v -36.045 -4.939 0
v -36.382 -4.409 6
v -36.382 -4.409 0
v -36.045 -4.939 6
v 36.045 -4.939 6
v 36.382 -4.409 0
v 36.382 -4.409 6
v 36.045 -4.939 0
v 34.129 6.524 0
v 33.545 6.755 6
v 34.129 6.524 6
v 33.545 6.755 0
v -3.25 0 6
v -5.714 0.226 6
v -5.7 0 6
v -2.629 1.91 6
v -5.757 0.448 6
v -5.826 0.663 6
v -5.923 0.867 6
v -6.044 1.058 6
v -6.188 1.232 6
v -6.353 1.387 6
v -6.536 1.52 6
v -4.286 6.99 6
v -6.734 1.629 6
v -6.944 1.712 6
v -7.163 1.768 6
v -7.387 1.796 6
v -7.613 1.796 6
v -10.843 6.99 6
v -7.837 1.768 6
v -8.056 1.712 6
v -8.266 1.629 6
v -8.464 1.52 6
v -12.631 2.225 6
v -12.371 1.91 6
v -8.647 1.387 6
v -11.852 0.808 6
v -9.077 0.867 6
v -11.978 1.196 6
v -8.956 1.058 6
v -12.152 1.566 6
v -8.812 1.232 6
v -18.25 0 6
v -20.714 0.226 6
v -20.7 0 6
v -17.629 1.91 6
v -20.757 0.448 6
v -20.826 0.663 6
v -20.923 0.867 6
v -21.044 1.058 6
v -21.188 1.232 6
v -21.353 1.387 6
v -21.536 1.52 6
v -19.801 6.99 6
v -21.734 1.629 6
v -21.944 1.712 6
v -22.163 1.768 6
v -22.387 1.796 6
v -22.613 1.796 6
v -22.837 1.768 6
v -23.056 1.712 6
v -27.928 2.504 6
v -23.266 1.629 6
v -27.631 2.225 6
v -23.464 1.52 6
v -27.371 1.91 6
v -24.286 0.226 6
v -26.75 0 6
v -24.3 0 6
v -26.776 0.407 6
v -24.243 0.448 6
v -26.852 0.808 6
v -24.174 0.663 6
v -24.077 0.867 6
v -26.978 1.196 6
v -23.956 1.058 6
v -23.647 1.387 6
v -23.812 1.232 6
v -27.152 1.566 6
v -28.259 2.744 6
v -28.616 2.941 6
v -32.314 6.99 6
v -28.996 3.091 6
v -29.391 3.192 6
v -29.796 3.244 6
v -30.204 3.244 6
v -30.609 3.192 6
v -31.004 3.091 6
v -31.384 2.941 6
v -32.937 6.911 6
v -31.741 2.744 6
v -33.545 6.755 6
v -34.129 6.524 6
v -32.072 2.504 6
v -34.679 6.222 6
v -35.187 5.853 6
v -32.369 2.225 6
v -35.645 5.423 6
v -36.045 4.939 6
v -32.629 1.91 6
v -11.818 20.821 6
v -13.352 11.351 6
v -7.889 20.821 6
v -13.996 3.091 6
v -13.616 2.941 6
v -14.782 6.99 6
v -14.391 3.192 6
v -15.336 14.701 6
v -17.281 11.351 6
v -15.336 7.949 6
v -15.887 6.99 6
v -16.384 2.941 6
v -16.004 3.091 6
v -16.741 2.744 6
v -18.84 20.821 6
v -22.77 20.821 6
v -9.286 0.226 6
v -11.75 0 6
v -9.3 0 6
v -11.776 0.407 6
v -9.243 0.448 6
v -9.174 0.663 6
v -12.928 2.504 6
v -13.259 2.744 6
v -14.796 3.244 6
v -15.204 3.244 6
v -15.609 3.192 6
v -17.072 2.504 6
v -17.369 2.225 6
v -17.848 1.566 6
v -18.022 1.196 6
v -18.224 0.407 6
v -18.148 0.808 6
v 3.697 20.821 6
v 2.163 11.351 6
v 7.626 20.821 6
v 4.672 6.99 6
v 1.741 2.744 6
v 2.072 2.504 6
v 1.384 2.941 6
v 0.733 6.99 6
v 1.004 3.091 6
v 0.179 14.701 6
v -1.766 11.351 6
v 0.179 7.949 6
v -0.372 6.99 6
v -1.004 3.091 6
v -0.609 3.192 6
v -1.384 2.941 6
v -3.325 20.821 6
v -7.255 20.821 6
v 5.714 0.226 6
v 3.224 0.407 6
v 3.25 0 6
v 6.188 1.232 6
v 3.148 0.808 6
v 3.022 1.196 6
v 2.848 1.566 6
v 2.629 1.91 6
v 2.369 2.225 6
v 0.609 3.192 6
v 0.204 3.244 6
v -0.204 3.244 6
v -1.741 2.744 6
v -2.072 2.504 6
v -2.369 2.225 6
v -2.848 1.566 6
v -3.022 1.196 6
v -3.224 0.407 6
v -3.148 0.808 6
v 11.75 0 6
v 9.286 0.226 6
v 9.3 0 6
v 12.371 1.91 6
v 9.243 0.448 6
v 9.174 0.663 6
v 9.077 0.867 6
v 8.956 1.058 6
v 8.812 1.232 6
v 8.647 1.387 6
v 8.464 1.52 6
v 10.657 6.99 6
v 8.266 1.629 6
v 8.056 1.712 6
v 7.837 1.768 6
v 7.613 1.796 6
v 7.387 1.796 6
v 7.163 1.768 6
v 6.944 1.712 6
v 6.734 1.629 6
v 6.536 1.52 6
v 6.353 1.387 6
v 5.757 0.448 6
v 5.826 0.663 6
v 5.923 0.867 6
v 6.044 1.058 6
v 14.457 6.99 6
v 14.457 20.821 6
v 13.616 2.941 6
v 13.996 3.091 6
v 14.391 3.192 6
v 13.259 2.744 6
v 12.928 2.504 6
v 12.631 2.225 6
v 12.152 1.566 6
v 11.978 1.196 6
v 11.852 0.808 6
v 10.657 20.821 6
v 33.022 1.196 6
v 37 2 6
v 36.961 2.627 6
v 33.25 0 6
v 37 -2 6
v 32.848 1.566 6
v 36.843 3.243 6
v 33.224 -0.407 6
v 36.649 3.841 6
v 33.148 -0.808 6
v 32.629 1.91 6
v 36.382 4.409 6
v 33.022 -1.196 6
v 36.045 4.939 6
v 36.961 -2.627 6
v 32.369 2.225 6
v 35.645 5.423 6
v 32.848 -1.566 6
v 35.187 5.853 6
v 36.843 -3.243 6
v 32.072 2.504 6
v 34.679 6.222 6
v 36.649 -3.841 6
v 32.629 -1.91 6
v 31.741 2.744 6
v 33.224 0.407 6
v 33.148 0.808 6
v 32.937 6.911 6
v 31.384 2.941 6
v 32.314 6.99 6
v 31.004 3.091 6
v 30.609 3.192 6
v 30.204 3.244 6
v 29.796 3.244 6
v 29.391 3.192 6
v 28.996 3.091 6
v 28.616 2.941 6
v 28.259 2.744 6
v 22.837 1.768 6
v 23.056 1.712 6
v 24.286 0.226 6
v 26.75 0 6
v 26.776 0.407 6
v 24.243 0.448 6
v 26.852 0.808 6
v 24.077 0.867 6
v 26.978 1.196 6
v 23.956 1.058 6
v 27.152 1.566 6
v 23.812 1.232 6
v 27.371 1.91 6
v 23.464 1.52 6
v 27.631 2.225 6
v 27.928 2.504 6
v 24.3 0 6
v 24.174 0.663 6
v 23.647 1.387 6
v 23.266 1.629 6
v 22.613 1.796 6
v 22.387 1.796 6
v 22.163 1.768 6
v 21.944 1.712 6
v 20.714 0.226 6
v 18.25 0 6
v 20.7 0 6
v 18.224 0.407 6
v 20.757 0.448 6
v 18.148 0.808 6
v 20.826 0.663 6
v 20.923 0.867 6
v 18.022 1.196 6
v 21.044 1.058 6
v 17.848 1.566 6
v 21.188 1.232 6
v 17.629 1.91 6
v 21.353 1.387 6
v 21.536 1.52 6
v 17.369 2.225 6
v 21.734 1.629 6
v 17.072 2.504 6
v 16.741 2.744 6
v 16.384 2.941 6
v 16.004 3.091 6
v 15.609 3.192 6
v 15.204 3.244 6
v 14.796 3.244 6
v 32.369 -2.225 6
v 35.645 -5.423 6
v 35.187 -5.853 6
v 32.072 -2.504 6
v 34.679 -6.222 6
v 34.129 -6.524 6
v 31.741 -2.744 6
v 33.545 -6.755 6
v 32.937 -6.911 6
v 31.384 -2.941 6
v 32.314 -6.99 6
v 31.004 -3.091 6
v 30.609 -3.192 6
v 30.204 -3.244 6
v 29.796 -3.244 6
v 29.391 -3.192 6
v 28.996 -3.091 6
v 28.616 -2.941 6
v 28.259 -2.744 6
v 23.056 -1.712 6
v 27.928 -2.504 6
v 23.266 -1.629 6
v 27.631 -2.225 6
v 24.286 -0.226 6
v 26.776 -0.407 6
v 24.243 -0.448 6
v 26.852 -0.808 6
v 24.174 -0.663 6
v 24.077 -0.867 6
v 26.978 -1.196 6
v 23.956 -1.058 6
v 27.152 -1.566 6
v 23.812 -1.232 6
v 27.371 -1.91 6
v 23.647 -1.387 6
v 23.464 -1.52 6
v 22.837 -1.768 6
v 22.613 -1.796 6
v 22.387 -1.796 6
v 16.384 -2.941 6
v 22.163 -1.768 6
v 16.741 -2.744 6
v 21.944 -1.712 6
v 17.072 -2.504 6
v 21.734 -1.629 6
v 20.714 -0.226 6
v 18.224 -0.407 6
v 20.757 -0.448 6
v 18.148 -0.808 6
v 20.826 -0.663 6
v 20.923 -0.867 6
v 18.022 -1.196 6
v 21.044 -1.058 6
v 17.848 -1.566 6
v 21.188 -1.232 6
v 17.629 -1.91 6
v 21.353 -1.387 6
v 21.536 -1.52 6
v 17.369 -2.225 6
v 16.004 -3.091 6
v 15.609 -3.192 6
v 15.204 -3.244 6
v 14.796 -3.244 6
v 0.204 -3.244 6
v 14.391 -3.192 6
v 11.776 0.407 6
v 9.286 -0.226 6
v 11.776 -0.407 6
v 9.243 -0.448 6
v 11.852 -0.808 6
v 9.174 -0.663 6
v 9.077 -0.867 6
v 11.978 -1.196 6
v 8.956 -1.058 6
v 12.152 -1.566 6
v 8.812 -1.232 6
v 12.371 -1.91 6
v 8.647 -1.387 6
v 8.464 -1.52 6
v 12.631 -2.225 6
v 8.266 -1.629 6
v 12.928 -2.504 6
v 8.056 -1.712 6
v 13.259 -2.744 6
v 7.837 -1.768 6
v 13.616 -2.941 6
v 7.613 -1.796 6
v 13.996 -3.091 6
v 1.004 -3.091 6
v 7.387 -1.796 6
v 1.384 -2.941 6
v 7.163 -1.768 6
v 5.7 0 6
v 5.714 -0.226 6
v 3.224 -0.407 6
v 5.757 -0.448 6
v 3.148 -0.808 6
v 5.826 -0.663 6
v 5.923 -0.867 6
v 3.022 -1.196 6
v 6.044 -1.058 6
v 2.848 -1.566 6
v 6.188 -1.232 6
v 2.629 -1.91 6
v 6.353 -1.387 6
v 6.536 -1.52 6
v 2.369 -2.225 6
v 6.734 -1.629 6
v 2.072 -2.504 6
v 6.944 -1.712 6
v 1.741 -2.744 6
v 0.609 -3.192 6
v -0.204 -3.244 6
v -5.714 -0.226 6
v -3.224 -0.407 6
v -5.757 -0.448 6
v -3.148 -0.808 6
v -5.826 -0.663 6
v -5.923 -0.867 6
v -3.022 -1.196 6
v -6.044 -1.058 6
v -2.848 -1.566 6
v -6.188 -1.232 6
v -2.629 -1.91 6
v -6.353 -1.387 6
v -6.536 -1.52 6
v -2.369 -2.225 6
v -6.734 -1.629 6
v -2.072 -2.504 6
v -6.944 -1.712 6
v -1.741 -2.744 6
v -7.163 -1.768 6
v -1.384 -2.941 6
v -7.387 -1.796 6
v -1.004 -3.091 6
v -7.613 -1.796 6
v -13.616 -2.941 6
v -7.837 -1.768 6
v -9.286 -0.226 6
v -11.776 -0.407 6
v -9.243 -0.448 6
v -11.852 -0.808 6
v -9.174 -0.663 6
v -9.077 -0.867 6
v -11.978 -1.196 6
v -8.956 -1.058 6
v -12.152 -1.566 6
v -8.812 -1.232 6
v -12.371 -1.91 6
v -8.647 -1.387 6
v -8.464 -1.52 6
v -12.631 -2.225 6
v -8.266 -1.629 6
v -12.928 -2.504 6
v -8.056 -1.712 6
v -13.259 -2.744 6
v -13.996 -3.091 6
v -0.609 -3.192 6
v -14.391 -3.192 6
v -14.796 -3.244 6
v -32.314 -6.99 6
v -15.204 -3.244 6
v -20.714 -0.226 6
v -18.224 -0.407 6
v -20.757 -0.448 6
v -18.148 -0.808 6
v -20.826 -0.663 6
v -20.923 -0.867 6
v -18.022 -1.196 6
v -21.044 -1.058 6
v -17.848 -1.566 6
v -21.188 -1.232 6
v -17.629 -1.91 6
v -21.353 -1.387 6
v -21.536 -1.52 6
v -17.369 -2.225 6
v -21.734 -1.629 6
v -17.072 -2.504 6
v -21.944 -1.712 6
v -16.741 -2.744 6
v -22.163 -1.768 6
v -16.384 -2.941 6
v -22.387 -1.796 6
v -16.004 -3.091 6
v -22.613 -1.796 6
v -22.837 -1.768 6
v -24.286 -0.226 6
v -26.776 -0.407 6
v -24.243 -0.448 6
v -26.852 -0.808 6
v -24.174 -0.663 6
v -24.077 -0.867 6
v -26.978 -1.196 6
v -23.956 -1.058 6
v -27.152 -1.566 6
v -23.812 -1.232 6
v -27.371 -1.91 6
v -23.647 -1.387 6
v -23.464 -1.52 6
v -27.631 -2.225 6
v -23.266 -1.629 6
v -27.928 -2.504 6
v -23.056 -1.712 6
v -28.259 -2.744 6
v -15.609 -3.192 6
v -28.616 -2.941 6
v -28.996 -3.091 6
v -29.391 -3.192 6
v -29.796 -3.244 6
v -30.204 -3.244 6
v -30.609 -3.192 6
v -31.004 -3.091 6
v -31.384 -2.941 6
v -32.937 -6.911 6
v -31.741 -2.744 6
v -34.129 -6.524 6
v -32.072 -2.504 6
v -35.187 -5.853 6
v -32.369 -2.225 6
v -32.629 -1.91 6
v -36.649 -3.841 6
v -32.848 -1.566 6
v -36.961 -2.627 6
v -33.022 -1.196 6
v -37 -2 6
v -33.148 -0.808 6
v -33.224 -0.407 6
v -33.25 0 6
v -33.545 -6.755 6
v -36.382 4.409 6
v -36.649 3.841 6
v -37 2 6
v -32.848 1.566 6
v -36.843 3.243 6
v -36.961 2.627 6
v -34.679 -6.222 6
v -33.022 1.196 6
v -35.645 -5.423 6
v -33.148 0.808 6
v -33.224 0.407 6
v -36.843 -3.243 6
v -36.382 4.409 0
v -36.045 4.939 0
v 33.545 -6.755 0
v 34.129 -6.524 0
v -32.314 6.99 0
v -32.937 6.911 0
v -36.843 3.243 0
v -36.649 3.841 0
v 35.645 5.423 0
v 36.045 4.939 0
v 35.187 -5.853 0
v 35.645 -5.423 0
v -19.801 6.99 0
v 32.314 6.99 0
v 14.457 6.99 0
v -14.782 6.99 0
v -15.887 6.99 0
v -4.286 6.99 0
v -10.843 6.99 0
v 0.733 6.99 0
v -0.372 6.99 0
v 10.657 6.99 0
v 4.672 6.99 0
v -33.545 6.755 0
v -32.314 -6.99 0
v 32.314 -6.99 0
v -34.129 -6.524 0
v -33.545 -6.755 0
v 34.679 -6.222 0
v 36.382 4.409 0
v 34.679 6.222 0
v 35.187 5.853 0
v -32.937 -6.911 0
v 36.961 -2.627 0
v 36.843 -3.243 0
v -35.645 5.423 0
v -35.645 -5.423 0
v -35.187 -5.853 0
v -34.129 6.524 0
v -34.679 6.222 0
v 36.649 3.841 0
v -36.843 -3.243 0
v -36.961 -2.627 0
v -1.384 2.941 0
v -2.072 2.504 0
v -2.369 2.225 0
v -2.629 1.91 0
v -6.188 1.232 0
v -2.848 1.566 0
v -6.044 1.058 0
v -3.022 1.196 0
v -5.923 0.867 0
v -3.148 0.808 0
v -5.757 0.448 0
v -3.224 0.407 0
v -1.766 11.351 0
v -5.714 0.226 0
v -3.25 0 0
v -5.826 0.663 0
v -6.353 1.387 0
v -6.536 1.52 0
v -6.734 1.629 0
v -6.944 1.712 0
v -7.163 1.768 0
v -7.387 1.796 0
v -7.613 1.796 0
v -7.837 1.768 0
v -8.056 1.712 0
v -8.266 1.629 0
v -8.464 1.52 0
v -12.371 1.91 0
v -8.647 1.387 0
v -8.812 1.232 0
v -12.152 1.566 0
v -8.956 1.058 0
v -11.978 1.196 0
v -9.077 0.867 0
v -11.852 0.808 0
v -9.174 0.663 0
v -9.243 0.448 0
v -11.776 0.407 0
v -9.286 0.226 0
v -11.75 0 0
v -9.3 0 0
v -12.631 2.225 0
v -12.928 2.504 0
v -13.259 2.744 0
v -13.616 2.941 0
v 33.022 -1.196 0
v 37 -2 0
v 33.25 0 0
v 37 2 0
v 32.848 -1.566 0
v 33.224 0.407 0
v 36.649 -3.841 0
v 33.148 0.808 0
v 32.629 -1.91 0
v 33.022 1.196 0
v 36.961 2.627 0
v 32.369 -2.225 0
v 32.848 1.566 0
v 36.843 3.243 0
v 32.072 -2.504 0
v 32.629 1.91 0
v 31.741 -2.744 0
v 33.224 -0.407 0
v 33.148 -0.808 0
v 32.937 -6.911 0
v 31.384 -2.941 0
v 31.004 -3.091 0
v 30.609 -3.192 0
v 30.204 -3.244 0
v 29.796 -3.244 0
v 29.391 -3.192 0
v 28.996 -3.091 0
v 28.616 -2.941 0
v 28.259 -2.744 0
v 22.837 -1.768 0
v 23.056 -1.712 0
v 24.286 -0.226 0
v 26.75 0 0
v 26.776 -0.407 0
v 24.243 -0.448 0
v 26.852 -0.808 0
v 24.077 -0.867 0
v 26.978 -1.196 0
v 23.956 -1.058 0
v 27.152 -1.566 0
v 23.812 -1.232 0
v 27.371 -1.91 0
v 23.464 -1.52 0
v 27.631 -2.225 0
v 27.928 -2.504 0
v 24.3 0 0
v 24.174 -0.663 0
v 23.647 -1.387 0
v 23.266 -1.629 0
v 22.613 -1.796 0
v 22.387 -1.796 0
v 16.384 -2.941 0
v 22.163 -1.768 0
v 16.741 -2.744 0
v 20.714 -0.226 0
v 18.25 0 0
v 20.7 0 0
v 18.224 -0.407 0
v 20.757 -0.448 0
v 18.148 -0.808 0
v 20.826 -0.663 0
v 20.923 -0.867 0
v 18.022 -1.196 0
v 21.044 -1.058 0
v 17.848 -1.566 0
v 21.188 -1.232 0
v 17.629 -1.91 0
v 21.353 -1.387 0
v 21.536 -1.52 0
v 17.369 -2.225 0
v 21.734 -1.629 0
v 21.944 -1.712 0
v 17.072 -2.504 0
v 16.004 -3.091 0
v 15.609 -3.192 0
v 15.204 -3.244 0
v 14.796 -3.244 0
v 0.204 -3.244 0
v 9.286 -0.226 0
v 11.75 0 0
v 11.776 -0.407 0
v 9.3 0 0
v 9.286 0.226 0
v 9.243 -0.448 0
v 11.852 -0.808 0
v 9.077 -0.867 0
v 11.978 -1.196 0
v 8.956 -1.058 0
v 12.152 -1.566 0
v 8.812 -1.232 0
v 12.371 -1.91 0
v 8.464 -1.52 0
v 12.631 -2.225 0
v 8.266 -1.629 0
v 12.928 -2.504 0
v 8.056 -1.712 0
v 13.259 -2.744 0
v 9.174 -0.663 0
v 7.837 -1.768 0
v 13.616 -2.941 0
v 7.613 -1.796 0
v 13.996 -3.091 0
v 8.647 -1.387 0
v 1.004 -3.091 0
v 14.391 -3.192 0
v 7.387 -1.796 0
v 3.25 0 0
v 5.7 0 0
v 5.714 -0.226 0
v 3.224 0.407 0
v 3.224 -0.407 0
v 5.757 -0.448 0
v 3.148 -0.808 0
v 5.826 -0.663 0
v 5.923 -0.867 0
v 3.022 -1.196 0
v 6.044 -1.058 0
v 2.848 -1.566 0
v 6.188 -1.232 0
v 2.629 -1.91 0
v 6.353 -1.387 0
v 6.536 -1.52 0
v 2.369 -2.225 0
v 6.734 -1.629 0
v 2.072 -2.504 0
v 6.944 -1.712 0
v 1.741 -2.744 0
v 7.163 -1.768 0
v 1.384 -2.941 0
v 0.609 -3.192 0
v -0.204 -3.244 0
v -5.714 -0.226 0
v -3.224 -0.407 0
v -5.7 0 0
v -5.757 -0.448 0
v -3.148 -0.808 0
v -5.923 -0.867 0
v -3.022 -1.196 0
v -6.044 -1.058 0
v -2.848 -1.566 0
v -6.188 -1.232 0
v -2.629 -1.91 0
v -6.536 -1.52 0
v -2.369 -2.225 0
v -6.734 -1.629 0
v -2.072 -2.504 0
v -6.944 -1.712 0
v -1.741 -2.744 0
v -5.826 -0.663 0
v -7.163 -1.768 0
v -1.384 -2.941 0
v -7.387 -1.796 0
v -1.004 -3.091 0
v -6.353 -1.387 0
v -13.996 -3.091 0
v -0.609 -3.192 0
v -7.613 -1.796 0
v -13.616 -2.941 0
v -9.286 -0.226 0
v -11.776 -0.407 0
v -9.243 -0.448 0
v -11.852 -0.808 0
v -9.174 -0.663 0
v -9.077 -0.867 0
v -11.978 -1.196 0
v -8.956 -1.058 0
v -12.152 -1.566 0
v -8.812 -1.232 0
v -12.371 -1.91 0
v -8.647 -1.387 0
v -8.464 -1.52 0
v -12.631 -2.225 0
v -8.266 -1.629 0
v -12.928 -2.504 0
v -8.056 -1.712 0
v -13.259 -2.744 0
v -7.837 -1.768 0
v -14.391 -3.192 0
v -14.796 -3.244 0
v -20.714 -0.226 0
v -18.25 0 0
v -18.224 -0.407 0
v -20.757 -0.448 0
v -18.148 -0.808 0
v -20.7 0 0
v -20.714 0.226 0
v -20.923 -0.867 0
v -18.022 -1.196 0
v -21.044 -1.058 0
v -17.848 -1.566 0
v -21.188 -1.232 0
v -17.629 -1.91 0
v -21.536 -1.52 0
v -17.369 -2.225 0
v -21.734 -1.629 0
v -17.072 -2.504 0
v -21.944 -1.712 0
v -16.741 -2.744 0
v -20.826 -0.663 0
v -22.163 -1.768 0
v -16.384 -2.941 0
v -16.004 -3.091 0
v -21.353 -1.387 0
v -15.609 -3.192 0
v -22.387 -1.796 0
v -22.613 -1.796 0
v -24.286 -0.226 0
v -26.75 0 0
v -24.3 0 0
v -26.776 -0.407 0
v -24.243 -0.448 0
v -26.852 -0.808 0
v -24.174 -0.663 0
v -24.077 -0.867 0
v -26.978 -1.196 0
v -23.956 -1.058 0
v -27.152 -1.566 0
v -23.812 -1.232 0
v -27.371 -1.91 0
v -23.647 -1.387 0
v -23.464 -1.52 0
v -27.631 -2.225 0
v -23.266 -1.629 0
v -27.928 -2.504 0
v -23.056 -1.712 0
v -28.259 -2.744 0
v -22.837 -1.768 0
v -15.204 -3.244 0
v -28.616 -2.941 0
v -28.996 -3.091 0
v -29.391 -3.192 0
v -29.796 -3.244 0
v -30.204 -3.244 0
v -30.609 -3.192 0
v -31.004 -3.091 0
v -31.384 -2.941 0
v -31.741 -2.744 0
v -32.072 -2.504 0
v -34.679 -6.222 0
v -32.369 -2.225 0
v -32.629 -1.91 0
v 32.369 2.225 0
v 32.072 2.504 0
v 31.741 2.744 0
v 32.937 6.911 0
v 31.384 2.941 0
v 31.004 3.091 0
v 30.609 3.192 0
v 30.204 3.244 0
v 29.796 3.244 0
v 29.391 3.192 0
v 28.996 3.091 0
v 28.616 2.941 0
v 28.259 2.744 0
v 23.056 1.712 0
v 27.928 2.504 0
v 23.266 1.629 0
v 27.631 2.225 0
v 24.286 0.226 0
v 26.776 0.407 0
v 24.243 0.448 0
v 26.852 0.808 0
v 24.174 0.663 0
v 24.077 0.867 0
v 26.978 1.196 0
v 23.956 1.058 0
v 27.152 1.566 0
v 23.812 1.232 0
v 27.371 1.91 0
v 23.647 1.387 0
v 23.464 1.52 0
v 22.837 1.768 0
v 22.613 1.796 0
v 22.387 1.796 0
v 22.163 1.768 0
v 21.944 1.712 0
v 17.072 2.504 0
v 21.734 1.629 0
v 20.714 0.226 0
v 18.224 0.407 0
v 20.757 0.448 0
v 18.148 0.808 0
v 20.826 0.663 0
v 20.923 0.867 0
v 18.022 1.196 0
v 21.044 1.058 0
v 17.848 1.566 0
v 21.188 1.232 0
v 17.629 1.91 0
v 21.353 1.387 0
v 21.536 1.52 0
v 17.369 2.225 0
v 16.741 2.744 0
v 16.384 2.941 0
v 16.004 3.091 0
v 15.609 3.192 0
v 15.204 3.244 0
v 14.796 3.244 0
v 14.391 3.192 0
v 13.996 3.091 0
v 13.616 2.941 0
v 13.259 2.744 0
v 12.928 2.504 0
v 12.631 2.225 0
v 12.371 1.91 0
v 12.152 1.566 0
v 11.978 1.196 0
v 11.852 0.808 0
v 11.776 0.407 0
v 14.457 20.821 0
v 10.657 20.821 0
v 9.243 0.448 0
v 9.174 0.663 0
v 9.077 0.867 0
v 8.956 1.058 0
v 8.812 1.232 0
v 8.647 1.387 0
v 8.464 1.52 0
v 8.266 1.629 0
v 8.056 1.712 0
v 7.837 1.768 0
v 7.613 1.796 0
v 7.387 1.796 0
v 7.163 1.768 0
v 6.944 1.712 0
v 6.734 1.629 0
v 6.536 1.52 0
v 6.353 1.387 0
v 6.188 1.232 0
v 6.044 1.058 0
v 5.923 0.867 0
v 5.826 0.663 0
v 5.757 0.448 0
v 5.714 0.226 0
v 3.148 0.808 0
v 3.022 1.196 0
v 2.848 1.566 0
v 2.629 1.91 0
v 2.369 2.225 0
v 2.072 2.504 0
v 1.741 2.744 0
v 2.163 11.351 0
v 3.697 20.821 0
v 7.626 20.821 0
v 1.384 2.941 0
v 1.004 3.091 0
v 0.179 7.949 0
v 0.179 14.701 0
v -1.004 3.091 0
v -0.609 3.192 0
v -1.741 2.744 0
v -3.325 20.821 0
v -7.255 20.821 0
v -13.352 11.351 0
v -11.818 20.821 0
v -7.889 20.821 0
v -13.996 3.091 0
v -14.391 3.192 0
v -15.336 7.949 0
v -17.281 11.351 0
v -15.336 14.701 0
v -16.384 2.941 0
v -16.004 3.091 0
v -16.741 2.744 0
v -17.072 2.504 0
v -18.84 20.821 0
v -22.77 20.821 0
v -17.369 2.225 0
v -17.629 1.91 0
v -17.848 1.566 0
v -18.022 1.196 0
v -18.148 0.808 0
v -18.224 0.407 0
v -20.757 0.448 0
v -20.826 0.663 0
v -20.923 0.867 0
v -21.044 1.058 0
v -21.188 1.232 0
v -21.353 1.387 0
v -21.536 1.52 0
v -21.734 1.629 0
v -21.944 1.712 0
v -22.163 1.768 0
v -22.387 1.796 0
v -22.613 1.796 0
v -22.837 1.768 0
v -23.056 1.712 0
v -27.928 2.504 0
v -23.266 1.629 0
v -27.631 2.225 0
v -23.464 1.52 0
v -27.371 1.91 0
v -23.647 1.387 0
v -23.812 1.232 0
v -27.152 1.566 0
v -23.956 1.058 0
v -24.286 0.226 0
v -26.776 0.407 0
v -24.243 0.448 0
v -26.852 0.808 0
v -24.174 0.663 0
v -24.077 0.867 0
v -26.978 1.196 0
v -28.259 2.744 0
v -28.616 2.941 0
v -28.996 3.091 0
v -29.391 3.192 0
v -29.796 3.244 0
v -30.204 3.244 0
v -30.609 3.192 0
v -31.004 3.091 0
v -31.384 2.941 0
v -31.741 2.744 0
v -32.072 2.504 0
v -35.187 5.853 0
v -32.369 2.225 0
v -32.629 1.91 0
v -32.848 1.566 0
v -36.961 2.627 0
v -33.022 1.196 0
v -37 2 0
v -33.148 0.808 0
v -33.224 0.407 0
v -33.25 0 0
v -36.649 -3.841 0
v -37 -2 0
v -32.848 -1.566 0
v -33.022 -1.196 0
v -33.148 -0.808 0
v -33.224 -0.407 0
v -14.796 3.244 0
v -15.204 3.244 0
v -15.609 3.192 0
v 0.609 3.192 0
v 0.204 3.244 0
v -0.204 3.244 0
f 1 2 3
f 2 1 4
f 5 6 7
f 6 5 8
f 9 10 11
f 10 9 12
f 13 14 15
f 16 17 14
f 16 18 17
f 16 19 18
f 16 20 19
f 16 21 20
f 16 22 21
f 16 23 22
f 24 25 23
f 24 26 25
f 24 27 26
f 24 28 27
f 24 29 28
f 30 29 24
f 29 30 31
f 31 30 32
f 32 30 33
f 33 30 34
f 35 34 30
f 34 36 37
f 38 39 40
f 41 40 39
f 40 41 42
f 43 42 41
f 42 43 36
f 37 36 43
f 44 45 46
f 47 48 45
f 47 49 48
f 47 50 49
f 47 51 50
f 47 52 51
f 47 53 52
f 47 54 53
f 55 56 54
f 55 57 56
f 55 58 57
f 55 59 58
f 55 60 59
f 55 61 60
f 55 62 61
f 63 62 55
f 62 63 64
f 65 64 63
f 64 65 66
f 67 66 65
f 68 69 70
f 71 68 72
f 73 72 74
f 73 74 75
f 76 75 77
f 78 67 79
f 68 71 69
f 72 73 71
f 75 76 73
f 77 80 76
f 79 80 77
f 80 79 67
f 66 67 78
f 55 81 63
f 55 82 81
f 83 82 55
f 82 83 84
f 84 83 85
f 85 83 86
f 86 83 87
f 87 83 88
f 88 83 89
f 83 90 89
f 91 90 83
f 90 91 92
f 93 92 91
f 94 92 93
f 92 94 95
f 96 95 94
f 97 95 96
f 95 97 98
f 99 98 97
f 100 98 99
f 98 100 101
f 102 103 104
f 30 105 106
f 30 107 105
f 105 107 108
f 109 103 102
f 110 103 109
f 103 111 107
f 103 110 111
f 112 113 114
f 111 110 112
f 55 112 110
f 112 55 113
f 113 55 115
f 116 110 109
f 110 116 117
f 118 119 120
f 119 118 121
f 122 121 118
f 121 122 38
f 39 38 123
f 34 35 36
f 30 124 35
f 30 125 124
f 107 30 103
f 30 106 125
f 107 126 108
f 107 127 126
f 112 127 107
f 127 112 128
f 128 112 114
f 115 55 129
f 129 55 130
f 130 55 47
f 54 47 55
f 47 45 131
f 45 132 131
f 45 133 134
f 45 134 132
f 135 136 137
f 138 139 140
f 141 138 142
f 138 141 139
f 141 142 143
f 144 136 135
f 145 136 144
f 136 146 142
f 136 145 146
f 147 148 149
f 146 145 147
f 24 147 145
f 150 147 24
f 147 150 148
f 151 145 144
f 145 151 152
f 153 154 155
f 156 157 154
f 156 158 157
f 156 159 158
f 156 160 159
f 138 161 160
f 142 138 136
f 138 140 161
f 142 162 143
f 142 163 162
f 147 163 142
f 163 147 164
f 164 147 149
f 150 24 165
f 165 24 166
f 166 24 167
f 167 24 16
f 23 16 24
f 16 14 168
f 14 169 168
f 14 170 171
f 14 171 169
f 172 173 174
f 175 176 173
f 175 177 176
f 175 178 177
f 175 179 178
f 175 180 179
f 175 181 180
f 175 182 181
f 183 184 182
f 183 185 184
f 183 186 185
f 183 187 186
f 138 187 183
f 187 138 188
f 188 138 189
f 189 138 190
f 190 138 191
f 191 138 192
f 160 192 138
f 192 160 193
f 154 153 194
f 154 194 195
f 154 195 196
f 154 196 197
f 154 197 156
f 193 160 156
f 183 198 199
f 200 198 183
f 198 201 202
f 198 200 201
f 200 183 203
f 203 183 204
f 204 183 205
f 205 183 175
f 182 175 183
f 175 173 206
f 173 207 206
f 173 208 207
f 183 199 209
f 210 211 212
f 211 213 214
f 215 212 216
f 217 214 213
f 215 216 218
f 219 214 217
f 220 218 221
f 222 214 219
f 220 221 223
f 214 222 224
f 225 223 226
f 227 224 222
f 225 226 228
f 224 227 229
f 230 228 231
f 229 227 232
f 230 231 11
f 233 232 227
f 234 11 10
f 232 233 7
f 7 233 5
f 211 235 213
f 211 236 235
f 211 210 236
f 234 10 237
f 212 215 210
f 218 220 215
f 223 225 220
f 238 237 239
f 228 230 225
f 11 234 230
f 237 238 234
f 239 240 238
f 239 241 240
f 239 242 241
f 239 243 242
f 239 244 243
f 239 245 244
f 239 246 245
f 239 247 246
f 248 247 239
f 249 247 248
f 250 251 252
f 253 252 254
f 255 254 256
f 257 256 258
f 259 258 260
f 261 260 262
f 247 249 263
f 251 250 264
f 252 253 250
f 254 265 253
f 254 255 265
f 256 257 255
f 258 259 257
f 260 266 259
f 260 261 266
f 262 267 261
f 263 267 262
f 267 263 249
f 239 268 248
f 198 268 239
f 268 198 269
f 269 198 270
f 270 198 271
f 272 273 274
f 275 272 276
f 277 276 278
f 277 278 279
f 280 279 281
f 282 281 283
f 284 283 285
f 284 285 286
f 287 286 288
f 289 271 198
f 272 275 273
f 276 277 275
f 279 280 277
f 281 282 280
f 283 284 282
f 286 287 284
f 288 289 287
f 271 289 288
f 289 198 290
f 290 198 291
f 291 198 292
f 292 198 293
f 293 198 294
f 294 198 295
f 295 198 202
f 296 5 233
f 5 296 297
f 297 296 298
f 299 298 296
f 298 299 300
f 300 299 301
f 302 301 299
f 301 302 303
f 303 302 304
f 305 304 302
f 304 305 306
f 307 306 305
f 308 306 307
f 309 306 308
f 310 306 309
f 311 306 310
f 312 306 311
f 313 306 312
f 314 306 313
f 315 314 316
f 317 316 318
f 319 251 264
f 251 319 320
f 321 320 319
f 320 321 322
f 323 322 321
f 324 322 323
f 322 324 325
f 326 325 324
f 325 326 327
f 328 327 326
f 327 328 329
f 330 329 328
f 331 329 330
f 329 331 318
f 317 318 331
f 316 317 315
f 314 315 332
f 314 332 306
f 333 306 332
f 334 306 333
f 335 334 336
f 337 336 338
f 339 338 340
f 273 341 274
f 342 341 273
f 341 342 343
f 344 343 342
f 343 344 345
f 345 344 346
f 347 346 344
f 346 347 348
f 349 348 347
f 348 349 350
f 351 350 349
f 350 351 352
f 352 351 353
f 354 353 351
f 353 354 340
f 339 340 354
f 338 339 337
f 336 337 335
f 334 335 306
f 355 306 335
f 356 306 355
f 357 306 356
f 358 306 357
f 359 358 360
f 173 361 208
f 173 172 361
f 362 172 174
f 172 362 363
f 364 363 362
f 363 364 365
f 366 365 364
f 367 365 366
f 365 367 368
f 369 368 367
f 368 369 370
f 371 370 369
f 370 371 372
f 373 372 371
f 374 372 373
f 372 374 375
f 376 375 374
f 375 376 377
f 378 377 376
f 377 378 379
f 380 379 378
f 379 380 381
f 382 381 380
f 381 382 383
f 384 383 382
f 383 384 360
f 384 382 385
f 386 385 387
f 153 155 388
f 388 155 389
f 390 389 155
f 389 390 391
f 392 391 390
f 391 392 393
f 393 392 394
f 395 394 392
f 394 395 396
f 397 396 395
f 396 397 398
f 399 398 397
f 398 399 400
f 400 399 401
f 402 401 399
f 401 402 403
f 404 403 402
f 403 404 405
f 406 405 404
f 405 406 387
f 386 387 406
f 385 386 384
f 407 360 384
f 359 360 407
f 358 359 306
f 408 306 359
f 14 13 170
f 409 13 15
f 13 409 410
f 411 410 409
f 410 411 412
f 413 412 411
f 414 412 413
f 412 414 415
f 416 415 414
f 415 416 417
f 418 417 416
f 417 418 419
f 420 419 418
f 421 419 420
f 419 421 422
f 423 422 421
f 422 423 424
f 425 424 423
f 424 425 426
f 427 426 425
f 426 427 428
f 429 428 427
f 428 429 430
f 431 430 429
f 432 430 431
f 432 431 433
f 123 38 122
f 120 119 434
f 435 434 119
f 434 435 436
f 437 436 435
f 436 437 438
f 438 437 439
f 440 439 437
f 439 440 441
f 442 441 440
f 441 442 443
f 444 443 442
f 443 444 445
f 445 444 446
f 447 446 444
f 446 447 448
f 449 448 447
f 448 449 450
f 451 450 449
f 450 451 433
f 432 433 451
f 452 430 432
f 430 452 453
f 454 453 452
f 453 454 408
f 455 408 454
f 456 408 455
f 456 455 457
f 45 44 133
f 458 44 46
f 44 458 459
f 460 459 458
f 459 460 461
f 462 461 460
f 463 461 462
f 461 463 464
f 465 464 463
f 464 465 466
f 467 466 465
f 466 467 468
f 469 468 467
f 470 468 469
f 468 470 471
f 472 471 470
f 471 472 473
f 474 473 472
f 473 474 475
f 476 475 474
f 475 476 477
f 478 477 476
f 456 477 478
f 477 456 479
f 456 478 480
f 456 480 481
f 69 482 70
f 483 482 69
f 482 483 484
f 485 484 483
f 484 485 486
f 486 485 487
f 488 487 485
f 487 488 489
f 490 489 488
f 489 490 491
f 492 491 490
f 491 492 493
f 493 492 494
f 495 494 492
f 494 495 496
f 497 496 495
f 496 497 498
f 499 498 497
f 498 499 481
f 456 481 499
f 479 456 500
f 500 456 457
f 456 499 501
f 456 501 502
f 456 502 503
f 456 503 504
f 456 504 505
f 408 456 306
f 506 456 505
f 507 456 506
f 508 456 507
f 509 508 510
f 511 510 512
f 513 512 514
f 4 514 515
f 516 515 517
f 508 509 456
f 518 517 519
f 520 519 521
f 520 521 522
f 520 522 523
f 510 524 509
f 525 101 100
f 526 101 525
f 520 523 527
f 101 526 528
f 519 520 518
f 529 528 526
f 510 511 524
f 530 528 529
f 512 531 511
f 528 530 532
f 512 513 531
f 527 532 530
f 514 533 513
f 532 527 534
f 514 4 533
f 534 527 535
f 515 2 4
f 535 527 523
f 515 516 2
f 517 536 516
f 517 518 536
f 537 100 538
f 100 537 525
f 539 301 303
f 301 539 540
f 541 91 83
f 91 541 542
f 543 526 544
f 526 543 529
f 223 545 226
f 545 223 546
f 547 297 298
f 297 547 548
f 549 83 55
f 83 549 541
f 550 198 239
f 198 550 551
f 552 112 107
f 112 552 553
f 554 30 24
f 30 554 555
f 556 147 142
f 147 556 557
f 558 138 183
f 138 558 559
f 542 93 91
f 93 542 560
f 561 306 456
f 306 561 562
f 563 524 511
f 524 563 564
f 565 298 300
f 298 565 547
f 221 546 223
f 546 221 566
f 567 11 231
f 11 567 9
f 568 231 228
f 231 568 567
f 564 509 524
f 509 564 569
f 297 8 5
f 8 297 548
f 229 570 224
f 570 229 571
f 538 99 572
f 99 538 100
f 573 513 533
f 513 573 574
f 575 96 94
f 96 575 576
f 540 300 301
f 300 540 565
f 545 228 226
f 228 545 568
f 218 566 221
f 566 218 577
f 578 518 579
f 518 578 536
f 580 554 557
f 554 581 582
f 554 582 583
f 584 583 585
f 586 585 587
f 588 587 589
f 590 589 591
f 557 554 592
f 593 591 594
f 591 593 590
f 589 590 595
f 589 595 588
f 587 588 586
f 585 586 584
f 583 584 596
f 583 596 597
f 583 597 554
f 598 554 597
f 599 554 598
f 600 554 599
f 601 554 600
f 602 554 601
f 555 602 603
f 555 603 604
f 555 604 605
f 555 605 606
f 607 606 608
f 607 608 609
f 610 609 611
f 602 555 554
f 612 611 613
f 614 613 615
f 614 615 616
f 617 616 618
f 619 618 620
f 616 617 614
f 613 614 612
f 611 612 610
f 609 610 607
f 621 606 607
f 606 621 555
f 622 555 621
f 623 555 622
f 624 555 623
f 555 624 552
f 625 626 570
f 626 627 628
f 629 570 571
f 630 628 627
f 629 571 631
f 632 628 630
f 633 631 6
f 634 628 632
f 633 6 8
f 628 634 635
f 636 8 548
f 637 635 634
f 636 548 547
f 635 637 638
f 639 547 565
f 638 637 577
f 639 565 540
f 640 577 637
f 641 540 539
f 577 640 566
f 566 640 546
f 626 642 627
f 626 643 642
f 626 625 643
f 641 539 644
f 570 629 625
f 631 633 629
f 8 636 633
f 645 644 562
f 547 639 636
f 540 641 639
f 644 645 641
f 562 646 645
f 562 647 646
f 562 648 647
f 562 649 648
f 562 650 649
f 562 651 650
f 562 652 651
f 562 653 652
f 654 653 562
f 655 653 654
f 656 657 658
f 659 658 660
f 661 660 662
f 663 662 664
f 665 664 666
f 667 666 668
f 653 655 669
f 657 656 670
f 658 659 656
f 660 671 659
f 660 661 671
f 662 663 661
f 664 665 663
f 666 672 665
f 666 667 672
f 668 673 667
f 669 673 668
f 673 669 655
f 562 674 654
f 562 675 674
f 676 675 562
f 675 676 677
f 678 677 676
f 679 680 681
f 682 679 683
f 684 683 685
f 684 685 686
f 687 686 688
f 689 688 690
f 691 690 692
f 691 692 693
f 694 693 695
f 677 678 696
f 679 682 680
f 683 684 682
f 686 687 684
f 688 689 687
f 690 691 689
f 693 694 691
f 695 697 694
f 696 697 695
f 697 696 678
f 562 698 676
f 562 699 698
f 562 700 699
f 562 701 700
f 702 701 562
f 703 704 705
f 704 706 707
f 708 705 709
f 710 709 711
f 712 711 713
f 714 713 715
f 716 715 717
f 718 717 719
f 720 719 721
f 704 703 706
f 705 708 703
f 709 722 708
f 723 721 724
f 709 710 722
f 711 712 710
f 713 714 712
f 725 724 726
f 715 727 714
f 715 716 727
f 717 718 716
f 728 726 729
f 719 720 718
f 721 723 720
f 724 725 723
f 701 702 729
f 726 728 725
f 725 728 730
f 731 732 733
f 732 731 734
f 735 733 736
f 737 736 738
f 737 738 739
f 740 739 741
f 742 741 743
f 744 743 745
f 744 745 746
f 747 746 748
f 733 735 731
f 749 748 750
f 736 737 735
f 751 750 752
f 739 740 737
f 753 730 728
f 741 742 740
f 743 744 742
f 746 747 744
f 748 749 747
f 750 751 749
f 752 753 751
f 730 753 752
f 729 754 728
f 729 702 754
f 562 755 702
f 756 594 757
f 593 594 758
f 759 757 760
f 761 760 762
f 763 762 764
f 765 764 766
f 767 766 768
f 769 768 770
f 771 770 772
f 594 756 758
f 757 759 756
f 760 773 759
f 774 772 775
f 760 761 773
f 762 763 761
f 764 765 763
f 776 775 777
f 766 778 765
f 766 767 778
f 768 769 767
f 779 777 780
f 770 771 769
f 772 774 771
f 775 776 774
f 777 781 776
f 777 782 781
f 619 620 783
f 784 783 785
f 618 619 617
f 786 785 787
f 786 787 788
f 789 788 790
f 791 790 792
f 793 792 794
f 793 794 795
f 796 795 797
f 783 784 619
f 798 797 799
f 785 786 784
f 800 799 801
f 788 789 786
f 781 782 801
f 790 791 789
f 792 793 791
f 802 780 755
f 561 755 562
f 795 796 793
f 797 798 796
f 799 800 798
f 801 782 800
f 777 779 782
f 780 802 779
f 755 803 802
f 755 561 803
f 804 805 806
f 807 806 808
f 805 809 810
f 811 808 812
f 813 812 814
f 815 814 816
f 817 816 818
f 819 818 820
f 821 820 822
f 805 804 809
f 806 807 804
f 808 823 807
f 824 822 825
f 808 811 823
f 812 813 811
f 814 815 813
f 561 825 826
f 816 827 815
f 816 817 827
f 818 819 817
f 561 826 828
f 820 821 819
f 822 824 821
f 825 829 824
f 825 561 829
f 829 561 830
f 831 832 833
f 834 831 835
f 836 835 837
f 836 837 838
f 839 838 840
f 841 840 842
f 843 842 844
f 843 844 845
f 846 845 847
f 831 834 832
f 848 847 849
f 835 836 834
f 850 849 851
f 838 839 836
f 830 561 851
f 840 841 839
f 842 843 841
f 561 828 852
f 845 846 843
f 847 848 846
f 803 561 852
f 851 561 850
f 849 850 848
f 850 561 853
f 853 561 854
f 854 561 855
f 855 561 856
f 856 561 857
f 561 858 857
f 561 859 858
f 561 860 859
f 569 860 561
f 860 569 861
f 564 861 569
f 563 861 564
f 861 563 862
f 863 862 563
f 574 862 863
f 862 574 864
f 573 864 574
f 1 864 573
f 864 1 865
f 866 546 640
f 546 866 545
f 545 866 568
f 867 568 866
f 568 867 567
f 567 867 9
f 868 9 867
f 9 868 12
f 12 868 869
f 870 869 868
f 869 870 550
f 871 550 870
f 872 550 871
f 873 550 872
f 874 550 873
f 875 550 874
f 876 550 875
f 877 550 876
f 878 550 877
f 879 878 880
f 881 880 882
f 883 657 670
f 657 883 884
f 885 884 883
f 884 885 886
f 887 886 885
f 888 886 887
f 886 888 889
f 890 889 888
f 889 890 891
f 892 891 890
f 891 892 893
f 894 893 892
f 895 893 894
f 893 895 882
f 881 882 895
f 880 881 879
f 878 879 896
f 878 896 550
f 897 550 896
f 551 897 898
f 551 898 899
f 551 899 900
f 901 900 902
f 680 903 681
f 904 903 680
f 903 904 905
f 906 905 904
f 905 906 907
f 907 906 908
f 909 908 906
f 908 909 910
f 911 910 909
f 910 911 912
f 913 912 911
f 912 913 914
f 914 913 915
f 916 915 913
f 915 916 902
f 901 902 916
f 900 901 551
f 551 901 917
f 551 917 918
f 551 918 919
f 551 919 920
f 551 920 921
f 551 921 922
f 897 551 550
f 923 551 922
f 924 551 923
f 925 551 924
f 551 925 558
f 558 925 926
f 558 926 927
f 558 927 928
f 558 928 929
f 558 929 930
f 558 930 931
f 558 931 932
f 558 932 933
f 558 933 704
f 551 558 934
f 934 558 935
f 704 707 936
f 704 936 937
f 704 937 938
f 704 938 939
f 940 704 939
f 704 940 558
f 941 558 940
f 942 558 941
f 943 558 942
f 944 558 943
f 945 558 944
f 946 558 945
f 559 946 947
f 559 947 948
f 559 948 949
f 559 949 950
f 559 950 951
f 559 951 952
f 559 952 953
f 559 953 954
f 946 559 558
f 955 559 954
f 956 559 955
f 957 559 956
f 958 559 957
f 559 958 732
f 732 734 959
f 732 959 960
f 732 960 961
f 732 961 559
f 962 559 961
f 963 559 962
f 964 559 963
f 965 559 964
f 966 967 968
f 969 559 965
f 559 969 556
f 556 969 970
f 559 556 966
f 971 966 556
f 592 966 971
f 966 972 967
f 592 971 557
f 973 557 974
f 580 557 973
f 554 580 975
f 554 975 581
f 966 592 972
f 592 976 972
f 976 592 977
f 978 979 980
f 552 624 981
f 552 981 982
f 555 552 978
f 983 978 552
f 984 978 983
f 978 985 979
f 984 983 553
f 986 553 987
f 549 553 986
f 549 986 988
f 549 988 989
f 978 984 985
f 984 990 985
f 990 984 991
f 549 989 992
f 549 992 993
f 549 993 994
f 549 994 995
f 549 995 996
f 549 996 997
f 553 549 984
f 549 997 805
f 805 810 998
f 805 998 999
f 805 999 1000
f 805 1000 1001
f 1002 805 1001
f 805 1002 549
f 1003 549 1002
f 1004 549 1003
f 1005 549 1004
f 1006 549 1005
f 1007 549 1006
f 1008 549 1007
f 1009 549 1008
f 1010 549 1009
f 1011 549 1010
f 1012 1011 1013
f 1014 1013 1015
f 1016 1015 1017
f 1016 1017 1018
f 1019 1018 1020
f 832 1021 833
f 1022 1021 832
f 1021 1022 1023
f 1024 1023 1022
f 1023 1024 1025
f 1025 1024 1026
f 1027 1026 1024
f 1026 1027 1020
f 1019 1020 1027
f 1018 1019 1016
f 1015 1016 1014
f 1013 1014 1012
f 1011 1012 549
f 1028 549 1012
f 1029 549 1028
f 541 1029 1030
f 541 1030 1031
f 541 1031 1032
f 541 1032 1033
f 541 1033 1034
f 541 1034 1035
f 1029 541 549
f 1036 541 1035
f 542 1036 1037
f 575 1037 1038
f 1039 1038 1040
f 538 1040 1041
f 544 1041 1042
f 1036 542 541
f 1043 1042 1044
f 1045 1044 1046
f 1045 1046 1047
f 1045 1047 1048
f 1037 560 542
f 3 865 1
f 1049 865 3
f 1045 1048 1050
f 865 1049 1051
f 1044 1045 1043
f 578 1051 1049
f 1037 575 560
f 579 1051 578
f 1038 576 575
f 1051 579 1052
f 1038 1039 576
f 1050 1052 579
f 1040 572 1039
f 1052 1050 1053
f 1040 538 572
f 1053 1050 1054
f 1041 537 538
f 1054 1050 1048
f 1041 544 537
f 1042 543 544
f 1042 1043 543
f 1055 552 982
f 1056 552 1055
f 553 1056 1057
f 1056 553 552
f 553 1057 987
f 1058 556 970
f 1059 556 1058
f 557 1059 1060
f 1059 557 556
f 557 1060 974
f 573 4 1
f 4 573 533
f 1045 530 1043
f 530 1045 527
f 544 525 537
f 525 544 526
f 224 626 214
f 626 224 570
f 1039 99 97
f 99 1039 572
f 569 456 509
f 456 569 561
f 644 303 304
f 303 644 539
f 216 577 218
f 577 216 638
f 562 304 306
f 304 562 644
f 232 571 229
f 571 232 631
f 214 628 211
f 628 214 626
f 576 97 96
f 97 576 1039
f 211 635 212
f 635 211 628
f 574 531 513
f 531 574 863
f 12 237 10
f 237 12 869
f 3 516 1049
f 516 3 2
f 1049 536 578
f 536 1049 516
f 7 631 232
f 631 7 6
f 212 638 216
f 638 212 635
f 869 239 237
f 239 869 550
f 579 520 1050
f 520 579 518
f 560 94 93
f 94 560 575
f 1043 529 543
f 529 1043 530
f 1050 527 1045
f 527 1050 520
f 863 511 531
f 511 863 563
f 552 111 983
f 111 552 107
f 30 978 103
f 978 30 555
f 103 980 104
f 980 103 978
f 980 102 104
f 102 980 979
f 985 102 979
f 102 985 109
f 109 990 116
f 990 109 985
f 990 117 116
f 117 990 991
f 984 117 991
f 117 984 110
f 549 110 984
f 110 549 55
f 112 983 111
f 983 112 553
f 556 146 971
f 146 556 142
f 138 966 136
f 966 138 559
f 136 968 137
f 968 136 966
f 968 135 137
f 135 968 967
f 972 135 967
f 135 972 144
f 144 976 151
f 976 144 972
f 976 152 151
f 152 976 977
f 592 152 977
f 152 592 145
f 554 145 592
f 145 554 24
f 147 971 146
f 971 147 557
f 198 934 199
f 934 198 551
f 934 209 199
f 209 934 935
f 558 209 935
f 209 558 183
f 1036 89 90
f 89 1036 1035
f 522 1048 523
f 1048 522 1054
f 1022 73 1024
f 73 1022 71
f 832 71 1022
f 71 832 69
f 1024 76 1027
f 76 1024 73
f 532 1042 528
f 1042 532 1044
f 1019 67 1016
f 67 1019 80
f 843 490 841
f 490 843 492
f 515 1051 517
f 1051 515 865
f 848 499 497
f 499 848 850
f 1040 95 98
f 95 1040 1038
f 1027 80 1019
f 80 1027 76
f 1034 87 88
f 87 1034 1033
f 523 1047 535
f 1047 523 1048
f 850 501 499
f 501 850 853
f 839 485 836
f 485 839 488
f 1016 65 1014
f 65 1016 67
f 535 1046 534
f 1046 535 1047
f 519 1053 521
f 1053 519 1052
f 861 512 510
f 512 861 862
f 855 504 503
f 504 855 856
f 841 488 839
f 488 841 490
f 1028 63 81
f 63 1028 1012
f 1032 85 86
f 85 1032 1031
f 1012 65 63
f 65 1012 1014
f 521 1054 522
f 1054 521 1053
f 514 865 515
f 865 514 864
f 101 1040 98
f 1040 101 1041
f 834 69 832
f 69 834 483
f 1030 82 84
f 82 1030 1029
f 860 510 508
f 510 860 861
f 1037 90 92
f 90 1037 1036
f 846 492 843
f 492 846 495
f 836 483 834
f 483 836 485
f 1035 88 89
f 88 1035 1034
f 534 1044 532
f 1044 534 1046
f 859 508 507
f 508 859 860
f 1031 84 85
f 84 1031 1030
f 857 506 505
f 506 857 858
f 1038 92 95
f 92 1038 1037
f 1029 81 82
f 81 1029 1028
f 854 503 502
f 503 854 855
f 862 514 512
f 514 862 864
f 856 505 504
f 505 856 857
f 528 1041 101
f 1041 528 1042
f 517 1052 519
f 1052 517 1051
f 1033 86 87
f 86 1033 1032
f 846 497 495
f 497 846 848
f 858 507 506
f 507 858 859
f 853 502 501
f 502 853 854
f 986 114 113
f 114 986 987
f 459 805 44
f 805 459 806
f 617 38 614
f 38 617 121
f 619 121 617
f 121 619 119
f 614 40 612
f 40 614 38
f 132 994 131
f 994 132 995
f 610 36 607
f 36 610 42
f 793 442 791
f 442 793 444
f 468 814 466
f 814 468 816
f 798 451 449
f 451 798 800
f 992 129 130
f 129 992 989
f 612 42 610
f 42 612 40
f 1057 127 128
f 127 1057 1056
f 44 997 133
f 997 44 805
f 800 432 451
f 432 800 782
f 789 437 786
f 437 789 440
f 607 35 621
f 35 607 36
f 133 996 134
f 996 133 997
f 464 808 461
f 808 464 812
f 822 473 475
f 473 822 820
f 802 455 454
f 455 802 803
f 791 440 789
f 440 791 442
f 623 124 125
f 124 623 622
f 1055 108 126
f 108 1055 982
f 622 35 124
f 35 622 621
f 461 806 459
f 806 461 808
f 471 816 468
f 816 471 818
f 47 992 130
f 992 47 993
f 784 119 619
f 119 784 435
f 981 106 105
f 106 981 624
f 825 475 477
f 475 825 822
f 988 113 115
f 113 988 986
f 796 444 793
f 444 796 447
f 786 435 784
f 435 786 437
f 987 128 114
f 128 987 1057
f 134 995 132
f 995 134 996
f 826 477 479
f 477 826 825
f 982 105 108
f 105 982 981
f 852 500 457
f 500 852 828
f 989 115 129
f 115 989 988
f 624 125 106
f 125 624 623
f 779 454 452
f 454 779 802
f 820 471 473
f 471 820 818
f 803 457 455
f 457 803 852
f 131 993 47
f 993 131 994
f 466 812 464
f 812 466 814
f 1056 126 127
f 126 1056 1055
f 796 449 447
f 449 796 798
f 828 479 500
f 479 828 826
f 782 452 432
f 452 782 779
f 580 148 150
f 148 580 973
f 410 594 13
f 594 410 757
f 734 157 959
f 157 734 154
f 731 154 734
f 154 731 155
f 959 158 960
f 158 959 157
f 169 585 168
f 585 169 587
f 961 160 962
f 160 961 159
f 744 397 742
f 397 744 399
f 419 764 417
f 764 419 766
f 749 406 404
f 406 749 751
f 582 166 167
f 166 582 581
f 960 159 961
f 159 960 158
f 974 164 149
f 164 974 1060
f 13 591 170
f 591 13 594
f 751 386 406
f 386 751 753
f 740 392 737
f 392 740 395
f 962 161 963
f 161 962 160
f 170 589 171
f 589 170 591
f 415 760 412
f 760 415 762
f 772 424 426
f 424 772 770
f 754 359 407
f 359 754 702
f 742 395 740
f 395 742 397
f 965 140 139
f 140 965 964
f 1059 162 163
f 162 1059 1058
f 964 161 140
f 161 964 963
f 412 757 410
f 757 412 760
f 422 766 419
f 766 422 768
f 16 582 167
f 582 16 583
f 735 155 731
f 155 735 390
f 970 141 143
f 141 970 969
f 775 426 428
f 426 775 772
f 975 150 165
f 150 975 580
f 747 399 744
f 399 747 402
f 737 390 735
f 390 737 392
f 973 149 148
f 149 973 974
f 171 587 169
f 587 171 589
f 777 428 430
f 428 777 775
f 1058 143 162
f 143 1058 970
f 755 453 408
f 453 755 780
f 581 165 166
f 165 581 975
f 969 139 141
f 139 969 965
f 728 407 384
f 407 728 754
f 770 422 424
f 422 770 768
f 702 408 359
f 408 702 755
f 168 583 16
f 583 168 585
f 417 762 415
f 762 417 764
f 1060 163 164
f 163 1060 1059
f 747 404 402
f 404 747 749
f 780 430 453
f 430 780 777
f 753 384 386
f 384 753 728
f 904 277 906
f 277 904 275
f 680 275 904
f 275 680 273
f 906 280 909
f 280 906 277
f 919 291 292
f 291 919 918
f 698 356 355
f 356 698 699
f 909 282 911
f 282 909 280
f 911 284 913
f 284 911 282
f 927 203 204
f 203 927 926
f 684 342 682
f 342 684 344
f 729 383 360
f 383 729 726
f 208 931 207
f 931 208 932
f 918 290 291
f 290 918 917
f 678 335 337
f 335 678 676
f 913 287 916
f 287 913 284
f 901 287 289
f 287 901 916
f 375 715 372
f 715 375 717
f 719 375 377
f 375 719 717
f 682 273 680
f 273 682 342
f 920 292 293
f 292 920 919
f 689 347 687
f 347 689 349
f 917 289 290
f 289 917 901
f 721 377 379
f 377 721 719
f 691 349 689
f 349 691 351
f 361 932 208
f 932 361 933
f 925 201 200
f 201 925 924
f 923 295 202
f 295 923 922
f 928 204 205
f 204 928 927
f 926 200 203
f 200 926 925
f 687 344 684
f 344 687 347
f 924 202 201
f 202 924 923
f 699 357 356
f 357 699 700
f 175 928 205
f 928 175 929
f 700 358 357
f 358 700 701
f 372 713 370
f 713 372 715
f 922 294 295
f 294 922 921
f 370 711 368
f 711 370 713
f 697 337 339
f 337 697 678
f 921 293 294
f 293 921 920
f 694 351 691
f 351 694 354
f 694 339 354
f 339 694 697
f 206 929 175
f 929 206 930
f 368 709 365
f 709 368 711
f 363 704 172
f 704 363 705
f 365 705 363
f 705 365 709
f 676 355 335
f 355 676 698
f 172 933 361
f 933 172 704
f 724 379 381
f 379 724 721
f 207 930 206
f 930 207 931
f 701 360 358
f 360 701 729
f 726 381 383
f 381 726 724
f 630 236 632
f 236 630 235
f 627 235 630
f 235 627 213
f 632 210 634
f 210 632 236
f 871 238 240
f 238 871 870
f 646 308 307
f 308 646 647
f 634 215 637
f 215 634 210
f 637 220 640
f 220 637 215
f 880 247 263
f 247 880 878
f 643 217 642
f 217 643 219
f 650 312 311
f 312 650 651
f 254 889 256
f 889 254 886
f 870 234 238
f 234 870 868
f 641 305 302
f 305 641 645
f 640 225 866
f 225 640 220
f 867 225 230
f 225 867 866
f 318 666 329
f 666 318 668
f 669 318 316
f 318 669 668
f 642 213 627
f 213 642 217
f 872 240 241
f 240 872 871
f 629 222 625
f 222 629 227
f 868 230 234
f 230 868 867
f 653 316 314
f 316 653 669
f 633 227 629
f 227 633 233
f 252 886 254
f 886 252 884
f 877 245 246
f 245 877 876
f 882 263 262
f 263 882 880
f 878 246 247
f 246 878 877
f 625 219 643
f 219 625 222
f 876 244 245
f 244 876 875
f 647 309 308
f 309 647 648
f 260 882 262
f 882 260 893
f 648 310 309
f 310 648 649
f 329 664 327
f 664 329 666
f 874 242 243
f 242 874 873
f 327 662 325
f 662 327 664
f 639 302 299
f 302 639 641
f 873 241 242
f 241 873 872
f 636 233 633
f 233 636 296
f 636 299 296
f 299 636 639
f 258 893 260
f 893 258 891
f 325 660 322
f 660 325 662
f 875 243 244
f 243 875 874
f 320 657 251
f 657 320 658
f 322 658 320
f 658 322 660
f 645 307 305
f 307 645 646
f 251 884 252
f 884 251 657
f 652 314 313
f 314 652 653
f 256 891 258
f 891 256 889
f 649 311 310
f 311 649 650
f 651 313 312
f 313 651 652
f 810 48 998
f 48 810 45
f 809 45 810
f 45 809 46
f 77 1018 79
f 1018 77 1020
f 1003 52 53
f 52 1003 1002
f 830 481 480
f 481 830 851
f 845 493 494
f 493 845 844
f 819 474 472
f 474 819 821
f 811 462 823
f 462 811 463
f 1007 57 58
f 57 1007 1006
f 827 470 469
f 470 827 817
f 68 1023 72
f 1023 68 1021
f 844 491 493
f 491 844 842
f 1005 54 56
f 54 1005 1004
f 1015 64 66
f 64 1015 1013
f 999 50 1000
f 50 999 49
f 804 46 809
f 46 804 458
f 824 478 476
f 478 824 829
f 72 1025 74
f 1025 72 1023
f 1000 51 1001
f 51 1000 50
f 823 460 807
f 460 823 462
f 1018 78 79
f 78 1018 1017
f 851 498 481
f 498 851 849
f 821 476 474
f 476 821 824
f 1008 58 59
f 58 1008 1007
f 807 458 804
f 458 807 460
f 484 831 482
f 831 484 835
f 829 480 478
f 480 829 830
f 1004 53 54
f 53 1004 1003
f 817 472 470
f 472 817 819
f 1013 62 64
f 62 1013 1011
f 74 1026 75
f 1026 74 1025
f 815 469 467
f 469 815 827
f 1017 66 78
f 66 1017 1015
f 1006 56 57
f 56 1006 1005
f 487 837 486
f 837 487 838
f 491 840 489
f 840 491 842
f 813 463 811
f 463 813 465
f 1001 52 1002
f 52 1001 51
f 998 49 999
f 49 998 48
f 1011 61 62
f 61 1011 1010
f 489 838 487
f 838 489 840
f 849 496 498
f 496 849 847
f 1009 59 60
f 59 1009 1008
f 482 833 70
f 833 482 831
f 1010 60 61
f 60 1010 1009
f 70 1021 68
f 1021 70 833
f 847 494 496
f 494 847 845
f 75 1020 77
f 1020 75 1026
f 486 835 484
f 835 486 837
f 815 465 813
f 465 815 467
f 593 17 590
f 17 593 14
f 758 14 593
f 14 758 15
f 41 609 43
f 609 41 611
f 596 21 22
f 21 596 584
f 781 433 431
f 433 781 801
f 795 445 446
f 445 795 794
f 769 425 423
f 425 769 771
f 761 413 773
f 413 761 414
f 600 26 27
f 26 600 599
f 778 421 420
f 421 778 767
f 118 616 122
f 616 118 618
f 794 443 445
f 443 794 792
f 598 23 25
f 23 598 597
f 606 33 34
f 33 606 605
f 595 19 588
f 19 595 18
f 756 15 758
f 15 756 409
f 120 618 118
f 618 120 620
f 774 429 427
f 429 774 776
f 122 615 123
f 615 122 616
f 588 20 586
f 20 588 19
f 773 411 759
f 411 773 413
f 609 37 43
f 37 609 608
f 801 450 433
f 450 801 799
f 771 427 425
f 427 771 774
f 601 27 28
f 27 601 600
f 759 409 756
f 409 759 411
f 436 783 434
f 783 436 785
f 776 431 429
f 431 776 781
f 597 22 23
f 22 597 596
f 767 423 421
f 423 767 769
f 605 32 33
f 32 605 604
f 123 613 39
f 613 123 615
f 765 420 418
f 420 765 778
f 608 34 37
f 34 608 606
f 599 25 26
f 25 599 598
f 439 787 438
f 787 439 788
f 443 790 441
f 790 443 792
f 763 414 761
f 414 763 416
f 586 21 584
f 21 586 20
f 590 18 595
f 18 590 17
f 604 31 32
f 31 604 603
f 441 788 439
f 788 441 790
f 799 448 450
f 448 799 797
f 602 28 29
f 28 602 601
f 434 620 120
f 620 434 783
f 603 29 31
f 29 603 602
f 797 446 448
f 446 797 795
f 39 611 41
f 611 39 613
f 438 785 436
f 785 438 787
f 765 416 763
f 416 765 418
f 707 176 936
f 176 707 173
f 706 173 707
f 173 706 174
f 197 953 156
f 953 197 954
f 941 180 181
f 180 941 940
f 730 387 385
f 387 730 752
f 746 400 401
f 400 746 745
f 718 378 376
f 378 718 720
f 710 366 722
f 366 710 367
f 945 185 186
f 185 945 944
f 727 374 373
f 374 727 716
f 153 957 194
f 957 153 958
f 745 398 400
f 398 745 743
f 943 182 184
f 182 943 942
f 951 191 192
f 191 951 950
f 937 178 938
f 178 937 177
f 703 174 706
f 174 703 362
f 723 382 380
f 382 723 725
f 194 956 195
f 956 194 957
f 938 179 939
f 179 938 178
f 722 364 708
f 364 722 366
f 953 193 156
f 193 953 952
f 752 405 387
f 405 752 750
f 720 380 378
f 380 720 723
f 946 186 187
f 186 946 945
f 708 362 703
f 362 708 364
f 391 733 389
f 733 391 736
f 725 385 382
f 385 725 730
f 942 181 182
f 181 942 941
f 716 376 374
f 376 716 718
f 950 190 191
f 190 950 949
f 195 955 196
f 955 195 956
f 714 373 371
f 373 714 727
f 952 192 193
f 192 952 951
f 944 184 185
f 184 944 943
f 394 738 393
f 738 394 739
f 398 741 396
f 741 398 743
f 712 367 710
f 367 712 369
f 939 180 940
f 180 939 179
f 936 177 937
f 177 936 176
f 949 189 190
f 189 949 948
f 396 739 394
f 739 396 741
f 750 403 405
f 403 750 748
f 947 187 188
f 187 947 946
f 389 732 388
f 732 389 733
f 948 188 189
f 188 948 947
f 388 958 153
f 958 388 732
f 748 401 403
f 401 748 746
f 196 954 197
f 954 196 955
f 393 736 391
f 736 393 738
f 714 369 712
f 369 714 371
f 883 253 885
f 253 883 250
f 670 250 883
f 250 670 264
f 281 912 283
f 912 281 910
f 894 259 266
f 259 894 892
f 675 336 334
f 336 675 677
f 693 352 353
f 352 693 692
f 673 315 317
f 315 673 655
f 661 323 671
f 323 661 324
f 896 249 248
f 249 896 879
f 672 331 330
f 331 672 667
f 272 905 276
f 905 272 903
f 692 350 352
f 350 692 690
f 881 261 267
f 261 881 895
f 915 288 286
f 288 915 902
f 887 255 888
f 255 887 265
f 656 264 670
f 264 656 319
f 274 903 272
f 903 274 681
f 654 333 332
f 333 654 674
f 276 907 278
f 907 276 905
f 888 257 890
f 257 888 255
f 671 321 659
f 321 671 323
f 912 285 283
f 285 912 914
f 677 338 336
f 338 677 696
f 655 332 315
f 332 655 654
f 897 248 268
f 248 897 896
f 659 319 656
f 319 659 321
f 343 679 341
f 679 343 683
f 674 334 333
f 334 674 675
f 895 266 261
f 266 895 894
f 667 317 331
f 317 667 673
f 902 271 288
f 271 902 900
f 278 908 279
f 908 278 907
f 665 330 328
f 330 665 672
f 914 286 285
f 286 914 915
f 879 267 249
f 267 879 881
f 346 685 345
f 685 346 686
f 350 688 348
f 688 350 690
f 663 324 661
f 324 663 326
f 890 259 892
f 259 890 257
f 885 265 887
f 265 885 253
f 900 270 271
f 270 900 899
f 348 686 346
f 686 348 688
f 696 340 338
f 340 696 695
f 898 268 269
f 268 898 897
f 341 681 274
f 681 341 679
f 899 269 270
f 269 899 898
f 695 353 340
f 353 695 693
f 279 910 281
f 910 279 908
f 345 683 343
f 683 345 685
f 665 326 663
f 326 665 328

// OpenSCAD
$fn = 50;


difference() {
	union() {
		hull() {
			translate(v = [-32.0000000000, 2.0000000000, 0]) {
				cylinder(h = 6, r = 5);
			}
			translate(v = [32.0000000000, 2.0000000000, 0]) {
				cylinder(h = 6, r = 5);
			}
			translate(v = [-32.0000000000, -2.0000000000, 0]) {
				cylinder(h = 6, r = 5);
			}
			translate(v = [32.0000000000, -2.0000000000, 0]) {
				cylinder(h = 6, r = 5);
			}
		}
		translate(v = [0, 20.3703703704, 0]) {
			linear_extrude(height = 6) {
				text(font = "DejaVu Sans Mono:style=Bold", halign = "center", size = 19.0000000000, text = "XXL", valign = "top");
			}
		}
	}
	union() {
		translate(v = [-30.0000000000, 0.0000000000, 0]) {
			translate(v = [0, 0, -100]) {
				cylinder(h = 200, r = 3.2500000000);
			}
		}
		translate(v = [-15.0000000000, 0.0000000000, 0]) {
			translate(v = [0, 0, -100]) {
				cylinder(h = 200, r = 3.2500000000);
			}
		}
		translate(v = [0, 0, -100]) {
			cylinder(h = 200, r = 3.2500000000);
		}
		translate(v = [15.0000000000, 0.0000000000, 0]) {
			translate(v = [0, 0, -100]) {
				cylinder(h = 200, r = 3.2500000000);
			}
		}
		translate(v = [30.0000000000, 0.0000000000, 0]) {
			translate(v = [0, 0, -100]) {
				cylinder(h = 200, r = 3.2500000000);
			}
		}
		translate(v = [-30.0000000000, 0.0000000000, 0]) {
			translate(v = [0, 0, -100]) {
				cylinder(h = 200, r = 1.8000000000);
			}
		}
		translate(v = [-22.5000000000, 0.0000000000, 0]) {
			translate(v = [0, 0, -100]) {
				cylinder(h = 200, r = 1.8000000000);
			}
		}
		translate(v = [-15.0000000000, 0.0000000000, 0]) {
			translate(v = [0, 0, -100]) {
				cylinder(h = 200, r = 1.8000000000);
			}
		}
		translate(v = [-7.5000000000, 0.0000000000, 0]) {
			translate(v = [0, 0, -100]) {
				cylinder(h = 200, r = 1.8000000000);
			}
		}
		translate(v = [0, 0, -100]) {
			cylinder(h = 200, r = 1.8000000000);
		}
		translate(v = [7.5000000000, 0.0000000000, 0]) {
			translate(v = [0, 0, -100]) {
				cylinder(h = 200, r = 1.8000000000);
			}
		}
		translate(v = [15.0000000000, 0.0000000000, 0]) {
			translate(v = [0, 0, -100]) {
				cylinder(h = 200, r = 1.8000000000);
			}
		}
		translate(v = [22.5000000000, 0.0000000000, 0]) {
			translate(v = [0, 0, -100]) {
				cylinder(h = 200, r = 1.8000000000);
			}
		}
		translate(v = [30.0000000000, 0.0000000000, 0]) {
			translate(v = [0, 0, -100]) {
				cylinder(h = 200, r = 1.8000000000);
			}
		}
	}
}
